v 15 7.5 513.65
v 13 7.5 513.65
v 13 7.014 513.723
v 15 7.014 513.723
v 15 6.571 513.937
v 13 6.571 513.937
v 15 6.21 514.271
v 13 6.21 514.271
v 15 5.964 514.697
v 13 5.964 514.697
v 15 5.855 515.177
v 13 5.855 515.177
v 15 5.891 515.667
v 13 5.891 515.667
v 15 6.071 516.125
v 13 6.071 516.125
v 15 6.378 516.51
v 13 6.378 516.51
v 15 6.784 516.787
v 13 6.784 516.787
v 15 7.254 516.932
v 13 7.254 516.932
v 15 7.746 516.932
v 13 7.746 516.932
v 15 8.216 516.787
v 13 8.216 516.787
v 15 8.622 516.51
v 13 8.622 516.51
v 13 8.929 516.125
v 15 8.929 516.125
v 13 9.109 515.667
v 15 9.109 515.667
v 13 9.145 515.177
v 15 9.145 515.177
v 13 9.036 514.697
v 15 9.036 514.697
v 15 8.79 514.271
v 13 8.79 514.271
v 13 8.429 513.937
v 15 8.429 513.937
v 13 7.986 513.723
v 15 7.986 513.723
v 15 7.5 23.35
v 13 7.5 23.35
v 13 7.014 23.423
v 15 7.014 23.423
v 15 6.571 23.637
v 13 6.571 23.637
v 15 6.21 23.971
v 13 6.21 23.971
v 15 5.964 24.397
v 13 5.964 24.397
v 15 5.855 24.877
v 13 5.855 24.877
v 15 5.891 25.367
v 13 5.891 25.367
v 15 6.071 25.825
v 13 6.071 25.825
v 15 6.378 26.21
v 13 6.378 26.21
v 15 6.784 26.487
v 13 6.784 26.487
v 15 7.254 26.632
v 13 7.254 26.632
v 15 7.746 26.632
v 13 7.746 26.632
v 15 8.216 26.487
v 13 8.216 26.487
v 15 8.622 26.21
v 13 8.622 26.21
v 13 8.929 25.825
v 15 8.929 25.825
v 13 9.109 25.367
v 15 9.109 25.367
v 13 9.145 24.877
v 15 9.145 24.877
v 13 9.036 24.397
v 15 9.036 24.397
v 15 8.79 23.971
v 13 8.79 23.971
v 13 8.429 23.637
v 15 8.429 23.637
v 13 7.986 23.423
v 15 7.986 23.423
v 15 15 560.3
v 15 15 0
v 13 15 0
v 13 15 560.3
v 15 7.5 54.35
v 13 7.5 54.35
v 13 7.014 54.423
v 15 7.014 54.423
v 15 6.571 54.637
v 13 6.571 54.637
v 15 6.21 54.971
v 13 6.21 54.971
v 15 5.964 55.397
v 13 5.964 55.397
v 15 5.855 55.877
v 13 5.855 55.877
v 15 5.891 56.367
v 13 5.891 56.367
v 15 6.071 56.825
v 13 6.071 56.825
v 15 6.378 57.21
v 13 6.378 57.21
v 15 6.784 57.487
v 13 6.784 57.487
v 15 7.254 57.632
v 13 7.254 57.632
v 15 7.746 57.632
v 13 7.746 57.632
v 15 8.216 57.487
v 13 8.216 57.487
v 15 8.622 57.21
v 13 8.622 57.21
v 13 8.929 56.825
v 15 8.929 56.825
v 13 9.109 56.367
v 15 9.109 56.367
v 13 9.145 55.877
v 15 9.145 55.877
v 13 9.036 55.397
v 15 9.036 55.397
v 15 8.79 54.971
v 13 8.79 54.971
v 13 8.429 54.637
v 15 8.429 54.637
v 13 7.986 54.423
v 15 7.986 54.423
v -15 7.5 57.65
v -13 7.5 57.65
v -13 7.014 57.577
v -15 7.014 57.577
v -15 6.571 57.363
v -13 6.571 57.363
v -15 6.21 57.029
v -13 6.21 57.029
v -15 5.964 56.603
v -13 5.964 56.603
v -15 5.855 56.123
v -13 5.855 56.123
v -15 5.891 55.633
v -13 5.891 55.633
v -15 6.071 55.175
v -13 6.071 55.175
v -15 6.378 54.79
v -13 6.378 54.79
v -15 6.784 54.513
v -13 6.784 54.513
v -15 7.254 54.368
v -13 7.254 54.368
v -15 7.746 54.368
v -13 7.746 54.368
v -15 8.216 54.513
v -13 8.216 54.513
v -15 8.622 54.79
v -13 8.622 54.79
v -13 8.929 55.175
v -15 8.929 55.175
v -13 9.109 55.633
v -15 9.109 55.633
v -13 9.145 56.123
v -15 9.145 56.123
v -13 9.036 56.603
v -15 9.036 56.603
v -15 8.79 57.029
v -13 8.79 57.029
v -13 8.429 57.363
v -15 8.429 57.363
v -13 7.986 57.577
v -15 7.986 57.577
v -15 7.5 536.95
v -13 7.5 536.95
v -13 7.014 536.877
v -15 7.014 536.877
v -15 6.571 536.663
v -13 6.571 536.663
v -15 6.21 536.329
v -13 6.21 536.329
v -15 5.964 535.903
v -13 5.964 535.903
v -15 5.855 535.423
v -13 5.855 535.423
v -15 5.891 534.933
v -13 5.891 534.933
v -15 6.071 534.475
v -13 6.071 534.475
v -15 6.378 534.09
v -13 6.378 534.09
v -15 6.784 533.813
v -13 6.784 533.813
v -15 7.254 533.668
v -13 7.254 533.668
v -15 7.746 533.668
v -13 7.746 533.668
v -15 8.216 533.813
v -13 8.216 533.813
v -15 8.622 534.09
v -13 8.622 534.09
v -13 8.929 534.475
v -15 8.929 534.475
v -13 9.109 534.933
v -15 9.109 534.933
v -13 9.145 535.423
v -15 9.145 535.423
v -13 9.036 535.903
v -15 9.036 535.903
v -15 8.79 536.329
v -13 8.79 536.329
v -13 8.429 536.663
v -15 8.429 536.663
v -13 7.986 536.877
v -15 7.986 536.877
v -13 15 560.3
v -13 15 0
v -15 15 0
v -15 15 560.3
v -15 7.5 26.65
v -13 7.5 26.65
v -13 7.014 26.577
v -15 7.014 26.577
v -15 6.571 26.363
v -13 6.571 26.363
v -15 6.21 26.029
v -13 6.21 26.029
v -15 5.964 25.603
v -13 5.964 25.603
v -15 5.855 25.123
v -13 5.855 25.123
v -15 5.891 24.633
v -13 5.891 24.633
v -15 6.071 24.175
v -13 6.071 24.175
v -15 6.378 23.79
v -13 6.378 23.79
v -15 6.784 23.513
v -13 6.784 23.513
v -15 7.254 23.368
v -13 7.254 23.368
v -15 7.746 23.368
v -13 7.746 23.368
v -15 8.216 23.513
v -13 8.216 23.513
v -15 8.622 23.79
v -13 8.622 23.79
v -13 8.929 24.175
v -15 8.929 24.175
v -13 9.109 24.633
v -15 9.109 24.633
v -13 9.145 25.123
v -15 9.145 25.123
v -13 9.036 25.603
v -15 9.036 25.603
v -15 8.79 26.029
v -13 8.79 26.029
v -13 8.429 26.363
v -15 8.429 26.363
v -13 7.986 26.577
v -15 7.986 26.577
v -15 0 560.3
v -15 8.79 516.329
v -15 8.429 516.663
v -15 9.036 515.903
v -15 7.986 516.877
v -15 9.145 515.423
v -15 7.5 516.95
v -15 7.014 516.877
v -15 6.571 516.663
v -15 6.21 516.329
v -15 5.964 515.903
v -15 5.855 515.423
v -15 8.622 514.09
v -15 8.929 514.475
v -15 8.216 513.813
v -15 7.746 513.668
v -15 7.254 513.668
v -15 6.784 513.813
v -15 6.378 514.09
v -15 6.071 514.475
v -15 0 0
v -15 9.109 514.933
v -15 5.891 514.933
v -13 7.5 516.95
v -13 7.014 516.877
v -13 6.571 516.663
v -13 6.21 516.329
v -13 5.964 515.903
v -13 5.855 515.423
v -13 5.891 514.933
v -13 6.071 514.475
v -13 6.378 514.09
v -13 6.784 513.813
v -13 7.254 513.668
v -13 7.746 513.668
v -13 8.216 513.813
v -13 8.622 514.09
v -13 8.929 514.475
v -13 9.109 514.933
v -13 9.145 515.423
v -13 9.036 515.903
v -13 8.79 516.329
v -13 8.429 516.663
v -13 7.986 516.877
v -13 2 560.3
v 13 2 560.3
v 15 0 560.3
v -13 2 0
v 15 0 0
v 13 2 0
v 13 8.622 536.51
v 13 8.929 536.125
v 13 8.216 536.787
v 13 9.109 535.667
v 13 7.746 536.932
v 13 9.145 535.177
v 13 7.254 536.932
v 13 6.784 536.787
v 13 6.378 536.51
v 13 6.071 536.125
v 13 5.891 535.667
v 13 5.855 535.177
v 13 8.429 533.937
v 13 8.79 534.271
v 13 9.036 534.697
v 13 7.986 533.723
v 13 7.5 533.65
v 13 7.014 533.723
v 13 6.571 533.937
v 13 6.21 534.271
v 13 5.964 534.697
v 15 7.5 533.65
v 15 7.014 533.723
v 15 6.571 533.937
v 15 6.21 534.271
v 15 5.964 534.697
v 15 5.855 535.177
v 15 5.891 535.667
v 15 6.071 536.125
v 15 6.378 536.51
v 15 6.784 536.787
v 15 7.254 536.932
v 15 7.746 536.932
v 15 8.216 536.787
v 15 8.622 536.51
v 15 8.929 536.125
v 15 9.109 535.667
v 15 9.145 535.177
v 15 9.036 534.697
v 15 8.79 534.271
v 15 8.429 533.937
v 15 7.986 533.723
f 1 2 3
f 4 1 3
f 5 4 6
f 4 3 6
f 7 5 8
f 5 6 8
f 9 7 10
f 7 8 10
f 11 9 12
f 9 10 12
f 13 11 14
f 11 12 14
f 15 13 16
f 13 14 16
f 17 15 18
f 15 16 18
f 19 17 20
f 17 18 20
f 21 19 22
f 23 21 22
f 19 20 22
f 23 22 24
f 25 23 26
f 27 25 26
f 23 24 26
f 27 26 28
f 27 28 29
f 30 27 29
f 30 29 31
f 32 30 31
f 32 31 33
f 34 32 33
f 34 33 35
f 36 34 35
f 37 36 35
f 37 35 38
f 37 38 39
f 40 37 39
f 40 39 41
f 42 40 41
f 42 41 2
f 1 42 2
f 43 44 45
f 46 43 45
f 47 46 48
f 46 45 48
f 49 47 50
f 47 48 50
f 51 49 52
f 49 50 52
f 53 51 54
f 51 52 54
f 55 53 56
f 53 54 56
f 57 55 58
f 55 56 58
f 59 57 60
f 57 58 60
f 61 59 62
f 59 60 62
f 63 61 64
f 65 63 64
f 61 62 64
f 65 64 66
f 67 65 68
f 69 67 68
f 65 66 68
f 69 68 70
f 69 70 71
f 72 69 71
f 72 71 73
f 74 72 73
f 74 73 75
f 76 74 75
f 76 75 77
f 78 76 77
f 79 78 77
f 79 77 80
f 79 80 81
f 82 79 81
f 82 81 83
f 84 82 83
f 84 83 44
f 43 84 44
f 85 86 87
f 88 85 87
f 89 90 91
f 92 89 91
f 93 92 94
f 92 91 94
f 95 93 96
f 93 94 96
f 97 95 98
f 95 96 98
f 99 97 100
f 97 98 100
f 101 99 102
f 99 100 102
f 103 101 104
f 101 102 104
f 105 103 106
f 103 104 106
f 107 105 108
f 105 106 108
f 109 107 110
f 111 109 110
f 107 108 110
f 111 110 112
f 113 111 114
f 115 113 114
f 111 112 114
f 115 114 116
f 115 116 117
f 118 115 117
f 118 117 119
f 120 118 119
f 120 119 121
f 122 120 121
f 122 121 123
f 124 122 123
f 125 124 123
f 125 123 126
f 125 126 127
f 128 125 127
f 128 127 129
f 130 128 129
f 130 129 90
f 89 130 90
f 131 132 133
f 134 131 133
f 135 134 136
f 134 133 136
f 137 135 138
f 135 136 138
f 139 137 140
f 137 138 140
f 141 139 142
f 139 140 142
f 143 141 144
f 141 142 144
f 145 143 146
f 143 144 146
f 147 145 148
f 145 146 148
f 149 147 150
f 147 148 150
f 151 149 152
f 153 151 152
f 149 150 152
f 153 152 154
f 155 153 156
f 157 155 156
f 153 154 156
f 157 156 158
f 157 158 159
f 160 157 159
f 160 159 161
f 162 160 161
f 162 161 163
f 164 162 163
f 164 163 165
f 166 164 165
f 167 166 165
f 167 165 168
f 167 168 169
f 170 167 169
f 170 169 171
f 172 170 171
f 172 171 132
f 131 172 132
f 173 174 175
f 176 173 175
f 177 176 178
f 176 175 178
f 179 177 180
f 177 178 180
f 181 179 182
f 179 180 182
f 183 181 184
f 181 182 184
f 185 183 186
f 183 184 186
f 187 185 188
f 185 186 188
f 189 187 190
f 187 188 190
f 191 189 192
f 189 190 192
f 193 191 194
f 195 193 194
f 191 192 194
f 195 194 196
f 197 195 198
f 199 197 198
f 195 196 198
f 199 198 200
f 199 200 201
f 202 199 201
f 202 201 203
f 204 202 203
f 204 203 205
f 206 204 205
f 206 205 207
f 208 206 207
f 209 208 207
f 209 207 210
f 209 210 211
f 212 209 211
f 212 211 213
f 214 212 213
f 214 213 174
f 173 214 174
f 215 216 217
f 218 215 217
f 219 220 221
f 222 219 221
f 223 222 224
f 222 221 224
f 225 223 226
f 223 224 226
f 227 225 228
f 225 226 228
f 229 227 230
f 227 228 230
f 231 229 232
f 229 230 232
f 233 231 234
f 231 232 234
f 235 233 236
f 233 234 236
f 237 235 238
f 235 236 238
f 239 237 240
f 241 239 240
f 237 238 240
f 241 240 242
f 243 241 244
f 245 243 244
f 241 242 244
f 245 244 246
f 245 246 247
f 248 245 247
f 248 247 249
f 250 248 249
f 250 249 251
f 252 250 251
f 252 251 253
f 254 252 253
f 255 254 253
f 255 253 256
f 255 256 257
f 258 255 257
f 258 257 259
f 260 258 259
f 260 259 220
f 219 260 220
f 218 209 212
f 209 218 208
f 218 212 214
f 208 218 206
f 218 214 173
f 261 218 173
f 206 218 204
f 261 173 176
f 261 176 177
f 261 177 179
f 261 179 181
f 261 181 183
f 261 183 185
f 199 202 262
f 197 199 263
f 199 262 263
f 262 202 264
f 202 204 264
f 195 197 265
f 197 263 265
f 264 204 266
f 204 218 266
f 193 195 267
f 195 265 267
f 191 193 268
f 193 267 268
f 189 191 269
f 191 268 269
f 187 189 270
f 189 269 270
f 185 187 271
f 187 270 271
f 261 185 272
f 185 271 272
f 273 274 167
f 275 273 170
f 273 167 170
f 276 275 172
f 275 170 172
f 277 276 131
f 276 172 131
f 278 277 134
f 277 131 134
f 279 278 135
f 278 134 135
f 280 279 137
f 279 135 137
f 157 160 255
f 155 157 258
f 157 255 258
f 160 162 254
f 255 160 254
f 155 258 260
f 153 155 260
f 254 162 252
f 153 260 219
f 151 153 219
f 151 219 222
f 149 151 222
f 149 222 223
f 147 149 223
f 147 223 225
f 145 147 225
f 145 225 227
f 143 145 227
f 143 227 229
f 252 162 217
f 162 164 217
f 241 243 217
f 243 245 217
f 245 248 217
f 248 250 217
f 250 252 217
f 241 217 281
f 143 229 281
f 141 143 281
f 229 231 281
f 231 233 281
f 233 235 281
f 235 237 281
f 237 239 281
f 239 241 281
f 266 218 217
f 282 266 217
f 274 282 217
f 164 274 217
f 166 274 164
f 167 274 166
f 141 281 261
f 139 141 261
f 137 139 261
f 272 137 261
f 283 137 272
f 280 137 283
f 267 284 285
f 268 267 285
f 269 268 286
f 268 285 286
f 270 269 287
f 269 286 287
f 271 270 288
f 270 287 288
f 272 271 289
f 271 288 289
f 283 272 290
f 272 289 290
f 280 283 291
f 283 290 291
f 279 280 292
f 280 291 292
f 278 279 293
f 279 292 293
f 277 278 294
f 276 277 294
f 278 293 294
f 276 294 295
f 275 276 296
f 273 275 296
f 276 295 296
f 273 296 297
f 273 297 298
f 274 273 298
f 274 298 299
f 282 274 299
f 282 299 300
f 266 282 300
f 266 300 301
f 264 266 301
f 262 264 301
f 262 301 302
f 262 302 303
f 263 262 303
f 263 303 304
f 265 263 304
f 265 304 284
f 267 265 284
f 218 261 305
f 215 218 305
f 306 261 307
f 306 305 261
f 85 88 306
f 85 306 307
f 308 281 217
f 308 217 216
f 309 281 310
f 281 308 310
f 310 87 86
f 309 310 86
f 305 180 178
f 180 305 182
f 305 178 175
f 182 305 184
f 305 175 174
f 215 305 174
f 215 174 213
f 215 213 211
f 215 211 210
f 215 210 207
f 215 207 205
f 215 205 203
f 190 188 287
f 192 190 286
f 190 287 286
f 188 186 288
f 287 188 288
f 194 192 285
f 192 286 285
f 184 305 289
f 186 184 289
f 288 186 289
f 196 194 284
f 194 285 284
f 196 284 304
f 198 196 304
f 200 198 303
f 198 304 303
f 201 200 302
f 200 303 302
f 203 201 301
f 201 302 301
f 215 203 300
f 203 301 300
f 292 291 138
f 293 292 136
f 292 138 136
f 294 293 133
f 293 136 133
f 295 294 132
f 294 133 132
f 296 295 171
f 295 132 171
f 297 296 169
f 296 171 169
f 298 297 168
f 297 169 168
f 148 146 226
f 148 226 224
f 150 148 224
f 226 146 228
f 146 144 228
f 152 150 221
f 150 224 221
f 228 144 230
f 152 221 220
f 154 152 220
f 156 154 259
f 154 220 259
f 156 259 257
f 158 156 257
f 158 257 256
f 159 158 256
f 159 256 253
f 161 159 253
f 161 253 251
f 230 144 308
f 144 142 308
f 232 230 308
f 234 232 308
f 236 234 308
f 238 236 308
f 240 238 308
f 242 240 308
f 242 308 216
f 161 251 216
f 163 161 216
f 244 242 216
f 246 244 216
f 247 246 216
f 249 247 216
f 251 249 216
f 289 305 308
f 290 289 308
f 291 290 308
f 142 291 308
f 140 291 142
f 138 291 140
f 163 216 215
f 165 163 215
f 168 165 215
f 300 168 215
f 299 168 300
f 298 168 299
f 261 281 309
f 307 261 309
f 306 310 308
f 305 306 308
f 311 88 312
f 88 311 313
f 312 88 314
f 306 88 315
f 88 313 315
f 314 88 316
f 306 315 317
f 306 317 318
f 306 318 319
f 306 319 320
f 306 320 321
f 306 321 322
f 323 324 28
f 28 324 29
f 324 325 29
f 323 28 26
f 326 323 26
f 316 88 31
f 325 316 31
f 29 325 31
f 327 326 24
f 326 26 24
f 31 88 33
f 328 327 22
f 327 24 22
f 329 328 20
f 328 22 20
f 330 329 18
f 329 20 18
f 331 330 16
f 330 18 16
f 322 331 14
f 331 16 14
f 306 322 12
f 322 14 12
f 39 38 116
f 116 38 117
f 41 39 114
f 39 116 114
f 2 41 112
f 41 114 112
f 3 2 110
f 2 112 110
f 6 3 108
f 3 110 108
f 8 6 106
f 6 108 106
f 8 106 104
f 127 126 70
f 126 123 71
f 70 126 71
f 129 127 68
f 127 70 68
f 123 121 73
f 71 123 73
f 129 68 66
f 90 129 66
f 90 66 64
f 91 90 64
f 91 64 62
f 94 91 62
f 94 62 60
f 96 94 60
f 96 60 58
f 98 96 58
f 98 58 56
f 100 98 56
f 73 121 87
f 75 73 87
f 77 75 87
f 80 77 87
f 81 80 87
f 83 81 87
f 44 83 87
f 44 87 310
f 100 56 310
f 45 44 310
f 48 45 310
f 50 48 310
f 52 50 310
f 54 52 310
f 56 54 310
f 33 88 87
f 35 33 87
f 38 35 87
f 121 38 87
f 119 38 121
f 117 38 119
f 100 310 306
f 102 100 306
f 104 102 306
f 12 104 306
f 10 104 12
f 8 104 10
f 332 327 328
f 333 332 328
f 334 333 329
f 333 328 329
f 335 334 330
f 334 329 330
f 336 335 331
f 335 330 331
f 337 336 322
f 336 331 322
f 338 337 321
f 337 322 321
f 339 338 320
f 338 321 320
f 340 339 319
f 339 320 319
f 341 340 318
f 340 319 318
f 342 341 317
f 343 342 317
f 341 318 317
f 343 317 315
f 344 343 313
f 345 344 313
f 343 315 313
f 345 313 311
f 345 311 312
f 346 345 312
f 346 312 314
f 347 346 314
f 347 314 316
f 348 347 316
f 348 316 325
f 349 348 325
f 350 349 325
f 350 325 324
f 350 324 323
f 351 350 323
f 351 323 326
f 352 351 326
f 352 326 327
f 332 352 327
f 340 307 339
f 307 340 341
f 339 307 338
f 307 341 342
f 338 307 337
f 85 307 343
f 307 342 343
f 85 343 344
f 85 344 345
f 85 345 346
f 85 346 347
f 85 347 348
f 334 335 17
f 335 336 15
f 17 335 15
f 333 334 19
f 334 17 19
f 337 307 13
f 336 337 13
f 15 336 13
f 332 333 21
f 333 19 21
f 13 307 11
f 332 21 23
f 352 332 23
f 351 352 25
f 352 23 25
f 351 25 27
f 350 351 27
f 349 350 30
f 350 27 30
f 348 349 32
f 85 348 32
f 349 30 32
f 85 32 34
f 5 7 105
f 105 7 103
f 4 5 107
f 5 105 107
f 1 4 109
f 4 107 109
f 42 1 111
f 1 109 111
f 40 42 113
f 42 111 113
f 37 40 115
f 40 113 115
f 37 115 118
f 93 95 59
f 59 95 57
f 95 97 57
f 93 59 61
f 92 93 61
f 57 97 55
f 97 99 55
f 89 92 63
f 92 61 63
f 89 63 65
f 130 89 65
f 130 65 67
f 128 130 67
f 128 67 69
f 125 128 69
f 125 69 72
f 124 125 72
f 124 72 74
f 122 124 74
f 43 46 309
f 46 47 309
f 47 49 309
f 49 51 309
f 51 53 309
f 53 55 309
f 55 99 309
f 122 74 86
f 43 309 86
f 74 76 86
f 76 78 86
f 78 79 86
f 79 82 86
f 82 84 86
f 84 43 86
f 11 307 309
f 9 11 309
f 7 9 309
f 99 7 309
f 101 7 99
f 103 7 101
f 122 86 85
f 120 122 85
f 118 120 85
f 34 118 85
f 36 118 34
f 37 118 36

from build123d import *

# Parameters (mm, degrees)
EXTRUDE_1_DEPTH = 560.3
M4X0_7_1_D      = 3.3
M4X0_7_1_DEPTH  = 11.5
M4X0_7_1_TIP    = 0.991420021
M4X0_7_2_D      = 3.3
M4X0_7_2_DEPTH  = 11.5
M4X0_7_2_TIP    = 0.991420021
M4X0_7_4_D      = 3.3
M4X0_7_4_DEPTH  = 11.5
M4X0_7_4_TIP    = 0.991420021


with BuildPart() as part:
    # ｽｹｯﾁ1 → ﾎﾞｽ - 押し出し1 (new body)
    with BuildSketch(Plane.XY):
        Polygon((0, 0), (15, 0), (15, 15), (13, 15), (13, 2), (-13, 2), (-13, 15), (-15, 15), (-15, 0), align=None)
    extrude(amount=EXTRUDE_1_DEPTH)

    # M4x0.7 ねじ穴1
    with Locations(Plane(origin=(15, 7.5, 56), x_dir=(0, 0, 1), z_dir=(1, 0, 0))):
        with Locations((0, 0), (-31, 0)):
            Hole(M4X0_7_1_D / 2, depth=M4X0_7_1_DEPTH)
            with Locations((0, 0, -(M4X0_7_1_DEPTH + M4X0_7_1_TIP / 2))):  # 118° drill point
                Cone(0, M4X0_7_1_D / 2, M4X0_7_1_TIP, mode=Mode.SUBTRACT)

    # M4x0.7 ねじ穴2
    with Locations(Plane(origin=(15, 7.5, 535.3), x_dir=(0, 0, 1), z_dir=(1, 0, 0))):
        with Locations((0, 0), (-20, 0)):
            Hole(M4X0_7_2_D / 2, depth=M4X0_7_2_DEPTH)
            with Locations((0, 0, -(M4X0_7_2_DEPTH + M4X0_7_2_TIP / 2))):  # 118° drill point
                Cone(0, M4X0_7_2_D / 2, M4X0_7_2_TIP, mode=Mode.SUBTRACT)

    # M4x0.7 ねじ穴4
    with Locations(Plane(origin=(-15, 7.5, 56), x_dir=(0, 0, -1), z_dir=(-1, 0, 0))):
        with Locations((0, 0), (31, 0), (-459.3, 0), (-479.3, 0)):
            Hole(M4X0_7_4_D / 2, depth=M4X0_7_4_DEPTH)
            with Locations((0, 0, -(M4X0_7_4_DEPTH + M4X0_7_4_TIP / 2))):  # 118° drill point
                Cone(0, M4X0_7_4_D / 2, M4X0_7_4_TIP, mode=Mode.SUBTRACT)


solid = part.part
